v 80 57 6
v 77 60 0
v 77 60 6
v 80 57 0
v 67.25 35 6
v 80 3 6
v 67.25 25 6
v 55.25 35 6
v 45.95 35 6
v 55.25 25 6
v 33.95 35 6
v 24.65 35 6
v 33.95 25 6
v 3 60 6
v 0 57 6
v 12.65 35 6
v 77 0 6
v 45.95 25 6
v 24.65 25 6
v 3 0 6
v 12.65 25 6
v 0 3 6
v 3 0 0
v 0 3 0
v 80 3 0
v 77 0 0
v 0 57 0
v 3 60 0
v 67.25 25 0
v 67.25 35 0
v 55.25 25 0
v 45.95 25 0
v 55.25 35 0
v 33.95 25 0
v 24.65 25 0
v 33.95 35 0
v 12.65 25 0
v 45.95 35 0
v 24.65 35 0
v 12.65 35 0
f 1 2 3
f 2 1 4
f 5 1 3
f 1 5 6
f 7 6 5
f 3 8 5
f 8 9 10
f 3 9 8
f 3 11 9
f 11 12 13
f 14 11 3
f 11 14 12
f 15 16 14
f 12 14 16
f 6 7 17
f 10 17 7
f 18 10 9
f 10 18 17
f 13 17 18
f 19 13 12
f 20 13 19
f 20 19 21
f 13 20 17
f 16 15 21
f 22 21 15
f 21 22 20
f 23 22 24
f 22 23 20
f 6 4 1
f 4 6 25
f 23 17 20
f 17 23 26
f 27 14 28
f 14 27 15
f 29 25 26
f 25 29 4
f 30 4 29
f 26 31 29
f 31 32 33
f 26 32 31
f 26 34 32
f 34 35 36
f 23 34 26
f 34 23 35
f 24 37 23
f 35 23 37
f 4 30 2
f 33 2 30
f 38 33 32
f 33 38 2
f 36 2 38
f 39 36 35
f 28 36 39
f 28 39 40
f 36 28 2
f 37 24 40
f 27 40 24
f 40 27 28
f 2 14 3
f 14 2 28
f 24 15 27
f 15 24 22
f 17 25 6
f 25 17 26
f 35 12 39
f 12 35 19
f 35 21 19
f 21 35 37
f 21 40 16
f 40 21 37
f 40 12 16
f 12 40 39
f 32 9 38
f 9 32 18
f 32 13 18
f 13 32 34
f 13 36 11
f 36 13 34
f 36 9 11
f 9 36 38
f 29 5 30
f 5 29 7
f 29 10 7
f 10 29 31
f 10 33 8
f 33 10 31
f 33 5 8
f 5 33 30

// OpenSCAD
$fn = 32;

// ----------------------------------------------------------------------
// Windowed plate: 3 voids, 80 x 60 x 6 mm
// ----------------------------------------------------------------------

// --- parameters (mm) ---
plate_l = 80;             // plate length, X
plate_w = 60;             // plate width, Y
plate_t = 6;              // plate thickness, Z
edge_margin = 8;          // wall from the plate edge to any window
windows = 3;              // number of windows in the row
win_l = 12;               // window length
win_w = 10;               // window width
win_pitch = 21.3;         // window pitch along X
depth_1 = 6;              // depth of void 1 (full thickness = through)
depth_2 = 6;              // depth of void 2 (full thickness = through)
depth_3 = 6;              // depth of void 3 (full thickness = through)
corner_c = 3;             // corner chamfer of the plate

profile = [[3, 0], [77, 0], [80, 3], [80, 57], [77, 60], [3, 60], [0, 57], [0, 3]];  // primary outline, 8 points, counter clockwise
void_1 = [[12.65, 25], [24.65, 25], [24.65, 35], [12.65, 35]];  // window 1 of the row, 4 points
void_2 = [[33.95, 25], [45.95, 25], [45.95, 35], [33.95, 35]];  // window 2 of the row, 4 points
void_3 = [[55.25, 25], [67.25, 25], [67.25, 35], [55.25, 35]];  // window 3 of the row, 4 points

// --- the one profile operation ---
difference() {
  linear_extrude(height = plate_t) polygon(points = profile);
  translate([0, 0, -1])
    linear_extrude(height = plate_t + 2) polygon(points = void_1);
  translate([0, 0, -1])
    linear_extrude(height = plate_t + 2) polygon(points = void_2);
  translate([0, 0, -1])
    linear_extrude(height = plate_t + 2) polygon(points = void_3);
}
